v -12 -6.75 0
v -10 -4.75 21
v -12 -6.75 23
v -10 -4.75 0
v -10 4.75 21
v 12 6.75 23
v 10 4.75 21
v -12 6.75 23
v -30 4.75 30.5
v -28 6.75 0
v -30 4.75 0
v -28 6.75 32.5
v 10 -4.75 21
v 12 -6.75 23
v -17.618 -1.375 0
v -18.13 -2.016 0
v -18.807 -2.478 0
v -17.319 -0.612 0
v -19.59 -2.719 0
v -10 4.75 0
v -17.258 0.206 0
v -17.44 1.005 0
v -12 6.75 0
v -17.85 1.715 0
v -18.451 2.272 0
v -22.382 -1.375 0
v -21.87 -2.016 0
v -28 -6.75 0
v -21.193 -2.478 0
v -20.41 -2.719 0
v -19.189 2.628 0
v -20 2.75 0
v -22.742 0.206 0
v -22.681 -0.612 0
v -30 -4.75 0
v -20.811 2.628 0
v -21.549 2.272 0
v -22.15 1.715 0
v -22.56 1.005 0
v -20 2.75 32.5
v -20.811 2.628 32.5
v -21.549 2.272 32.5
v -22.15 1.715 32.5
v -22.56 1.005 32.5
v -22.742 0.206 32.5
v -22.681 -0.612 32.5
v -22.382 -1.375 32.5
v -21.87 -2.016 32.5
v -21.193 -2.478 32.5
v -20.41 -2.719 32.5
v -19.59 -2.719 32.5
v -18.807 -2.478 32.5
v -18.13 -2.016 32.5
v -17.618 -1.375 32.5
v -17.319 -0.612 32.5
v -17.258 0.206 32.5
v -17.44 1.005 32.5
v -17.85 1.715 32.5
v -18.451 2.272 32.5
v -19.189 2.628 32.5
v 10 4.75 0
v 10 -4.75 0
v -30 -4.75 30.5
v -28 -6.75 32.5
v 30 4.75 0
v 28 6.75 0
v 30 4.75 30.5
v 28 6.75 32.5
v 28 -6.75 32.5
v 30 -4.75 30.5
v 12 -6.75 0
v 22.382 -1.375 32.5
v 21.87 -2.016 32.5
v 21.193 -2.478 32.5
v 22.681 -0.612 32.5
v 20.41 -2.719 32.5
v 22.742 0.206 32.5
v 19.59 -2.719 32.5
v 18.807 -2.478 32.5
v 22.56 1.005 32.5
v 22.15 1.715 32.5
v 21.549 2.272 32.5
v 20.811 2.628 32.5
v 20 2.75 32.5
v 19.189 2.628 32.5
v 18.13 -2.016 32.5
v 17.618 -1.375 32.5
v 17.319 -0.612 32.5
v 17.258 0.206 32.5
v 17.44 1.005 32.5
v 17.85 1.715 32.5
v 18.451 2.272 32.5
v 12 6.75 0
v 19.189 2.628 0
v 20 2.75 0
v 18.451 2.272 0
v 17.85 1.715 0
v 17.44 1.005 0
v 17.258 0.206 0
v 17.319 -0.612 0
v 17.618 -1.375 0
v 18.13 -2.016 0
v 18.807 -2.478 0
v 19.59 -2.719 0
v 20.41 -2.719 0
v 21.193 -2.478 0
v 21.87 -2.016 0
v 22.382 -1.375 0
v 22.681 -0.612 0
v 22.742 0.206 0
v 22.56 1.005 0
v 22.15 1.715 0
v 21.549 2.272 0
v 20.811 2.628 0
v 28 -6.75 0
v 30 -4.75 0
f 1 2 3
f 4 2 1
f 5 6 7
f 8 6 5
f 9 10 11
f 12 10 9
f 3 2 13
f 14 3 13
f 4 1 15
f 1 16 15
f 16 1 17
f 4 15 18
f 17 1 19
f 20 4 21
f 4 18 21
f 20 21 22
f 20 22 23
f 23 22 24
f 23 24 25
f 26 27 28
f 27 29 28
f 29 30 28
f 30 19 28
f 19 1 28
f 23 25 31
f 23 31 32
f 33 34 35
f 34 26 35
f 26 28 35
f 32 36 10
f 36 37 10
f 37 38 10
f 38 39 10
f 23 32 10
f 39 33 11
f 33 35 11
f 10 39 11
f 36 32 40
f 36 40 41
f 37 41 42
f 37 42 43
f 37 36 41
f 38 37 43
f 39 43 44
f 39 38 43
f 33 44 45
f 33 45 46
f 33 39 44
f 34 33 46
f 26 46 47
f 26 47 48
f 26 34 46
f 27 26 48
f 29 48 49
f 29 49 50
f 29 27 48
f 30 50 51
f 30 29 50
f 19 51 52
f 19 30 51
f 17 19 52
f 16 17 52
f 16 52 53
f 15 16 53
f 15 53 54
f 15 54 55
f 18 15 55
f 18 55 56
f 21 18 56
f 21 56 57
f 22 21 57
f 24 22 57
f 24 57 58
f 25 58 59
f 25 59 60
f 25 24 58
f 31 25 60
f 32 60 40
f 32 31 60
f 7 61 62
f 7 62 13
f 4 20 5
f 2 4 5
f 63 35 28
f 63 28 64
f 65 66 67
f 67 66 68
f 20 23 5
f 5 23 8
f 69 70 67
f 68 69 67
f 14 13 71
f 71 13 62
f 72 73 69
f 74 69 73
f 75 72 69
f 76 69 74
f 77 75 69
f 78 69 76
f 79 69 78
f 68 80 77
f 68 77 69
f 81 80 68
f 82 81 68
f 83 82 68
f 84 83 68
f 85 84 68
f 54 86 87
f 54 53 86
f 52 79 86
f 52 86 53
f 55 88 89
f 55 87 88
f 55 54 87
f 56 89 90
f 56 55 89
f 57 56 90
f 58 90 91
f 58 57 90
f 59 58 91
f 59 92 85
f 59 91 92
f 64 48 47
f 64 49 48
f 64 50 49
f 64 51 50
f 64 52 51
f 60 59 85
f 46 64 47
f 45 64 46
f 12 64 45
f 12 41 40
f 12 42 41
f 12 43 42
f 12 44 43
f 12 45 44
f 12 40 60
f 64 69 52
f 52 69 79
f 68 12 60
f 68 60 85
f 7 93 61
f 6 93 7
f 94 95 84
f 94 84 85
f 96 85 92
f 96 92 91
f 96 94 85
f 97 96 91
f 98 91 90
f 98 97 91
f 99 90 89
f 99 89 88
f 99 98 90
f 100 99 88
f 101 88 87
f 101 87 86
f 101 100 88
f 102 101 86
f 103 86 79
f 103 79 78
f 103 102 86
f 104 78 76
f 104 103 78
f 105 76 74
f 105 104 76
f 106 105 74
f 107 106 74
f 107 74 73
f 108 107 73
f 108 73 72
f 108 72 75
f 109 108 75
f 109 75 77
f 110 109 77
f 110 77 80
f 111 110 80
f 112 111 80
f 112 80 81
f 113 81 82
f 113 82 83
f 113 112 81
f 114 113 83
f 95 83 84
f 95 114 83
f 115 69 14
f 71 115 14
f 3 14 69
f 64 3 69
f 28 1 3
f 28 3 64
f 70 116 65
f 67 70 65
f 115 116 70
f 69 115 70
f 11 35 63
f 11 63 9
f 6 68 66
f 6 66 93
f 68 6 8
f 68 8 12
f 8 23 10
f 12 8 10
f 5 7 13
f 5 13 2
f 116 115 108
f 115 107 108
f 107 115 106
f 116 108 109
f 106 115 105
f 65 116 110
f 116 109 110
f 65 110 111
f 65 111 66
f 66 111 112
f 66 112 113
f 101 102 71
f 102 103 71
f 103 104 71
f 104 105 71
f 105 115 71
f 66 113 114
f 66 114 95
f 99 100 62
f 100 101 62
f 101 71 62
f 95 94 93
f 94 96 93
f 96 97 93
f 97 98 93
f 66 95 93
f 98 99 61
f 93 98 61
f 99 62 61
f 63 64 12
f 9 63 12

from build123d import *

# Parameters (mm, degrees)
SKETCH1_W           = 13.5
SKETCH1_H           = 60
SKETCH1_R           = 2.75
BOSS_EXTRUDE1_DEPTH = 32.5
SKETCH2_W           = 20
SKETCH2_H           = 21
CUT_EXTRUDE1_DEPTH  = 14.5
CHAMFER1_SIZE       = 2
CHAMFER2_SIZE       = 2


with BuildPart() as part:
    # Sketch1 → Boss-Extrude1 (new body)
    with BuildSketch(Plane(origin=(0, 0, 0), x_dir=(0, 1, 0), z_dir=(0, 0, 1))):
        Rectangle(SKETCH1_W, SKETCH1_H)
        with Locations((0, 20)):
            Circle(SKETCH1_R, mode=Mode.SUBTRACT)
        with Locations((0, -20)):
            Circle(SKETCH1_R, mode=Mode.SUBTRACT)
    extrude(amount=BOSS_EXTRUDE1_DEPTH)

    # Sketch2 → Cut-Extrude1 (cut, through all)
    with BuildSketch(Plane(origin=(0, 6.75, 0), x_dir=(-1, 0, 0), z_dir=(0, 1, 0))):
        with Locations((0, 10.5)):
            Rectangle(SKETCH2_W, SKETCH2_H)
    extrude(amount=-CUT_EXTRUDE1_DEPTH, mode=Mode.SUBTRACT)

    # Chamfer1
    chamfer1_edges = [part.edges().sort_by_distance(p)[0] for p in [
        (30, 0, 32.5),
        (30, 6.75, 16.25),
        (30, -6.75, 16.25),
        (-30, -6.75, 16.25),
        (-30, 6.75, 16.25),
        (-30, 0, 32.5),
    ]]
    chamfer(chamfer1_edges, length=CHAMFER1_SIZE)

    # Chamfer2
    chamfer2_edges = [part.edges().sort_by_distance(p)[0] for p in [
        (10, -6.75, 10.5),
        (0, -6.75, 21),
        (-10, -6.75, 10.5),
        (10, 6.75, 10.5),
        (-10, 6.75, 10.5),
        (0, 6.75, 21),
    ]]
    chamfer(chamfer2_edges, length=CHAMFER2_SIZE)


solid = part.part
